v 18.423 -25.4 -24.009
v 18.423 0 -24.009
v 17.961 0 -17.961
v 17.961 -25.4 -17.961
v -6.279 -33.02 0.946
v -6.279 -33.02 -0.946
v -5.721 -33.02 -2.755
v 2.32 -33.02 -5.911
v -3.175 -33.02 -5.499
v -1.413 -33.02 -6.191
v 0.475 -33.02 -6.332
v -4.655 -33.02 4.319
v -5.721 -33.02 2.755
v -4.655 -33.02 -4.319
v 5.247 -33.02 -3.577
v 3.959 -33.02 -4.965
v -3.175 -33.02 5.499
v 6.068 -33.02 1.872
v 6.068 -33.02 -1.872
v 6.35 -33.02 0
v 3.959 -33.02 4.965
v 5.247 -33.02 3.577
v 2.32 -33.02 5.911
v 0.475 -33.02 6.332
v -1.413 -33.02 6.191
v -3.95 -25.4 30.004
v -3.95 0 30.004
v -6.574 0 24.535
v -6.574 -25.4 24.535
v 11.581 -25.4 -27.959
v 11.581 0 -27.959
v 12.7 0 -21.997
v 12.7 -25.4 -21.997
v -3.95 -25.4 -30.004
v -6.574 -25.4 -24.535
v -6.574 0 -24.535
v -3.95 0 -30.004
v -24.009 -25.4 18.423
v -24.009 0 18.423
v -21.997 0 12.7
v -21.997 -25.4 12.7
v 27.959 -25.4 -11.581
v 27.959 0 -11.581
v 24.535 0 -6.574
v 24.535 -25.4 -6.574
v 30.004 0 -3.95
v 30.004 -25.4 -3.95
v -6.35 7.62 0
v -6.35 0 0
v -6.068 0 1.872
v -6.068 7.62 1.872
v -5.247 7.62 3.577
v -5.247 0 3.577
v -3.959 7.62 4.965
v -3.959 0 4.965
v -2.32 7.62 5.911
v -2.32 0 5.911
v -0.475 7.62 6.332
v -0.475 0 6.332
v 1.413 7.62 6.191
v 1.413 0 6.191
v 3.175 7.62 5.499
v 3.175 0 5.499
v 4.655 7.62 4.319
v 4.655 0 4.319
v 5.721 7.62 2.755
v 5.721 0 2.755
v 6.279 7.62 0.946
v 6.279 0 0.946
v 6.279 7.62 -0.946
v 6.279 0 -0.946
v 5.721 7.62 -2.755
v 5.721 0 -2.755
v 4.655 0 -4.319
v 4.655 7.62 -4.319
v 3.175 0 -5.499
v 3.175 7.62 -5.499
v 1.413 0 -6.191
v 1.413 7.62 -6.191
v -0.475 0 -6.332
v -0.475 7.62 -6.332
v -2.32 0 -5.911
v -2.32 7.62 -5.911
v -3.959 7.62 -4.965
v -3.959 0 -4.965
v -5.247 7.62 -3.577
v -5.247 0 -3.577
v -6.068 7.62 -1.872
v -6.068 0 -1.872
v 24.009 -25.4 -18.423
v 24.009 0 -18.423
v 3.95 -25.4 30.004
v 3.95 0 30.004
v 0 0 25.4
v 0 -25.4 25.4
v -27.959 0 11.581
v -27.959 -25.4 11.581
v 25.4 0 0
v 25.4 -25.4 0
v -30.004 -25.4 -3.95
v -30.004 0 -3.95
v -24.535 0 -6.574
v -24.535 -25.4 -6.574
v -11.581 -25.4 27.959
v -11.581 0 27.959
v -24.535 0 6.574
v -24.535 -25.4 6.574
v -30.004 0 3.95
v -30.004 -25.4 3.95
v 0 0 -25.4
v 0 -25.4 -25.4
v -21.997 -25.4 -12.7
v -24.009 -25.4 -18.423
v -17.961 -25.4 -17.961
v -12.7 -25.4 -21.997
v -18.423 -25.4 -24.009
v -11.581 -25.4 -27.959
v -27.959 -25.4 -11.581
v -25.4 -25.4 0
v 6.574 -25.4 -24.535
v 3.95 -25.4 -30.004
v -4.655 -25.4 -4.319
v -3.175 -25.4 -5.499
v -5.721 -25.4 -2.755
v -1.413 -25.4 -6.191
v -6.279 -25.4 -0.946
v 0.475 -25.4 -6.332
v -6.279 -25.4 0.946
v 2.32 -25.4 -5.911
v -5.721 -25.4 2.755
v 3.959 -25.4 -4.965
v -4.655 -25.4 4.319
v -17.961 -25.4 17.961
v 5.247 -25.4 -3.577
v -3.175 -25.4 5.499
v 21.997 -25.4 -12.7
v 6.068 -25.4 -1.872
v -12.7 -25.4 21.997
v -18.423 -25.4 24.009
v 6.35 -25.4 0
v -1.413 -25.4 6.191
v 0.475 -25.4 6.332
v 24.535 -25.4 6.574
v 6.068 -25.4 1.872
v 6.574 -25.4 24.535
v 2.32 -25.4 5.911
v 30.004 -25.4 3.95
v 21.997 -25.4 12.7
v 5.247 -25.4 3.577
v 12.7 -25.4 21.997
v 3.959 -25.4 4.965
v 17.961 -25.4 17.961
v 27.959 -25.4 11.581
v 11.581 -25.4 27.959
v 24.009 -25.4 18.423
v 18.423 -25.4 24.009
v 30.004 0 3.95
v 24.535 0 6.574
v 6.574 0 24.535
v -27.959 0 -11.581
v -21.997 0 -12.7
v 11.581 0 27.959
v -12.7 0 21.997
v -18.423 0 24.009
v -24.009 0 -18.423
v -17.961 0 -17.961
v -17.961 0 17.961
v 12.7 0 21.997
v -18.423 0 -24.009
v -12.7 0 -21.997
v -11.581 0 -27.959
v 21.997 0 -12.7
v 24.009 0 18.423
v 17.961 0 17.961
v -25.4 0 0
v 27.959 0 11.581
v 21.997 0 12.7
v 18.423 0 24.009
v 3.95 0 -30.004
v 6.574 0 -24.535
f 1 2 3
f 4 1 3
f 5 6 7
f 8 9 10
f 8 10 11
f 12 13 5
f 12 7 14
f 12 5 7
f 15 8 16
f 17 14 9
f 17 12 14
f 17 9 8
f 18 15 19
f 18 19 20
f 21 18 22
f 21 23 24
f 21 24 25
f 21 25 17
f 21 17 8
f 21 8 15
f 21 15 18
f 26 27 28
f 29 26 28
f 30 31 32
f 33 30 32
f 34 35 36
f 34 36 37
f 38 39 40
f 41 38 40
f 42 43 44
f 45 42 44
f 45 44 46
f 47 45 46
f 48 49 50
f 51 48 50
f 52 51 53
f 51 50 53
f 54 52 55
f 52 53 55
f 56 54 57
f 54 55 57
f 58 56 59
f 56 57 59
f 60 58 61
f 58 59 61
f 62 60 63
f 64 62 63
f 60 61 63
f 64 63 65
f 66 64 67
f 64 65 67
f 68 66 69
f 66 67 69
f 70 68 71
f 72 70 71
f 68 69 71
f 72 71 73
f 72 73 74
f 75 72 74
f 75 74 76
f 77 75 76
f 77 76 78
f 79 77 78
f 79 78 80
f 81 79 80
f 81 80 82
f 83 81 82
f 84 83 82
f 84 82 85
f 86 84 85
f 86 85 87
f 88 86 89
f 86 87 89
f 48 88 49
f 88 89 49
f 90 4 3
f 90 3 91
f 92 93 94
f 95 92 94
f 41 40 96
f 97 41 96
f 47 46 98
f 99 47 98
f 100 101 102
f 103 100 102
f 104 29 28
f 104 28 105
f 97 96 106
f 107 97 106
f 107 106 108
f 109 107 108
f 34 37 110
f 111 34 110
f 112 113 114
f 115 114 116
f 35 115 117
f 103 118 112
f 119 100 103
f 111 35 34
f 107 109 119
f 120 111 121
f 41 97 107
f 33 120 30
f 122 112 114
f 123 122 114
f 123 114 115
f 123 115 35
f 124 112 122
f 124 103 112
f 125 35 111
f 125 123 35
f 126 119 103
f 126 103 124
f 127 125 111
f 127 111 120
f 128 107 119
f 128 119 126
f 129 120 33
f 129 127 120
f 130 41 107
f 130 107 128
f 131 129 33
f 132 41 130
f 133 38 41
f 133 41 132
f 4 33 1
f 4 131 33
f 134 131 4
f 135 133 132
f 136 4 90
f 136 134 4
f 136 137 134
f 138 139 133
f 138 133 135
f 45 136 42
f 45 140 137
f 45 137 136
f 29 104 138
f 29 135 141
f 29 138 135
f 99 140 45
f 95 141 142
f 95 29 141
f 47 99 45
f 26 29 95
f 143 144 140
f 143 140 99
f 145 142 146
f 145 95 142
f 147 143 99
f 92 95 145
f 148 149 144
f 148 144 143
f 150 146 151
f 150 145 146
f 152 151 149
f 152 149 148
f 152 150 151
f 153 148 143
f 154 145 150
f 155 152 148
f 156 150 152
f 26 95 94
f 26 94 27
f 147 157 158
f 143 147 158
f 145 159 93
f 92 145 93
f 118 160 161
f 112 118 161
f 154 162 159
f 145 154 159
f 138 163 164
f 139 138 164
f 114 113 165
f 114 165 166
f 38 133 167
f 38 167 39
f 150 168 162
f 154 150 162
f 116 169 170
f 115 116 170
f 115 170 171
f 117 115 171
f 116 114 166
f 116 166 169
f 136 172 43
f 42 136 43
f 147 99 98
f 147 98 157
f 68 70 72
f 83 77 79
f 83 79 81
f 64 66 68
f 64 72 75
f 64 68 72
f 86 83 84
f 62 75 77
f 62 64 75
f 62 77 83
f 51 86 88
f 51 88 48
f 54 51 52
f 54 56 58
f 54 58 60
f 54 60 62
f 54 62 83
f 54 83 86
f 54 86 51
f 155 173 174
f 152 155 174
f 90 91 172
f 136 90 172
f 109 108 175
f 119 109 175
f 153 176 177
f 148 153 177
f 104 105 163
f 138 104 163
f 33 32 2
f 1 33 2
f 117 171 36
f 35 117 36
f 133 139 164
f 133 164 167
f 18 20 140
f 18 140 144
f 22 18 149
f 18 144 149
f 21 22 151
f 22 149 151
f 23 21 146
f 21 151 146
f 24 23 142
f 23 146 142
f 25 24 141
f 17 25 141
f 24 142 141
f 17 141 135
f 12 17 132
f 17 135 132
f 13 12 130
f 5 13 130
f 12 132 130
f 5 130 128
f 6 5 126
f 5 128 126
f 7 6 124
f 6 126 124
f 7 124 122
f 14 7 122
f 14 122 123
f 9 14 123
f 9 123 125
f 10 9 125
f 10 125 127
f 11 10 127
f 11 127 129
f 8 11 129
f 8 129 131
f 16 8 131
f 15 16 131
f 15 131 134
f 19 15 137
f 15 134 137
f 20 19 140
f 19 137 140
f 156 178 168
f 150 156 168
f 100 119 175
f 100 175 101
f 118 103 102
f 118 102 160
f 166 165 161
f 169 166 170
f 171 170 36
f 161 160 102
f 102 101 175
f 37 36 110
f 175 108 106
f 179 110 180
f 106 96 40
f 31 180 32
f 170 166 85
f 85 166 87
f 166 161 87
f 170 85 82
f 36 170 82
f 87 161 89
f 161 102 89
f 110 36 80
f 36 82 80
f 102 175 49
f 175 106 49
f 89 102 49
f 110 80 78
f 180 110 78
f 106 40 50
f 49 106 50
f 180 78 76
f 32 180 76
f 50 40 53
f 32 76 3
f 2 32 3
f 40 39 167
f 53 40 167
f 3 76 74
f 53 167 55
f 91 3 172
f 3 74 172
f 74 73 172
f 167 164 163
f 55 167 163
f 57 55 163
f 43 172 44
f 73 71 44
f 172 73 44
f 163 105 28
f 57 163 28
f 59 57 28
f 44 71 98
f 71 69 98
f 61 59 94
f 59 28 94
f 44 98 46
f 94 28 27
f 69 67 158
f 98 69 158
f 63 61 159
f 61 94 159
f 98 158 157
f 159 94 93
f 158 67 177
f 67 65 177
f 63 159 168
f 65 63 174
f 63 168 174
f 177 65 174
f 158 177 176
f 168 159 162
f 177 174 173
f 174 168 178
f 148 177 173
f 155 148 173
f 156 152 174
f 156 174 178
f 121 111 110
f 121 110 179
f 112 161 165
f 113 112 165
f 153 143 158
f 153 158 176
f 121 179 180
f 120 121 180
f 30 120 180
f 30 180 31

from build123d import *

# Parameters (mm, degrees)
F1_DEPTH = 25.4
F2_R     = 6.35
F3_DEPTH = 7.62
F4_R     = 6.35
F5_DEPTH = 7.62


with BuildPart() as f1:
    # F0 (on Front) → F1 (new body)
    with BuildSketch(Plane.XZ):
        with BuildLine():
            Line((24.9672579939, 3.2870018728), (25.4, 0))
            ThreePointArc((25.4, 0), (25.3456166503, 1.6612394824), (25.1826994789, 3.3153652824))
            Line((25.1826994789, 3.3153652824), (24.9672579939, 3.2870018728))
        make_face()
        with BuildLine():
            Line((30.0037978897, -3.9500749293), (25.4, 0))
            ThreePointArc((25.4, 0), (25.3456166503, -1.6612394824), (25.1826994789, -3.3153652824))
            Line((25.1826994789, -3.3153652824), (30.0037978897, -3.9500749293))
        make_face()
        Polygon((24.9672579939, -3.2870018728), (25.4, 0), (0, 0), (24.5345159877, -6.5740037456), align=None)
        with BuildLine():
            ThreePointArc((25.1826994789, -3.3153652824), (25.3456166503, -1.6612394824), (25.4, 0))
            Line((25.4, 0), (24.9672579939, -3.2870018728))
            Line((24.9672579939, -3.2870018728), (25.1826994789, -3.3153652824))
        make_face()
        Polygon((0, 0), (25.4, 0), (24.9672579939, 3.2870018728), (24.5345159877, 6.5740037456), align=None)
        with BuildLine():
            ThreePointArc((25.1826994789, 3.3153652824), (25.3456166503, 1.6612394824), (25.4, 0))
            Line((25.4, 0), (30.0037978897, 3.9500749293))
            Line((30.0037978897, 3.9500749293), (25.1826994789, 3.3153652824))
        make_face()
        with BuildLine():
            Line((24.9672579939, 3.2870018728), (25.1826994789, 3.3153652824))
            ThreePointArc((25.1826994789, 3.3153652824), (24.9119461222, 4.9552941792), (24.5345159877, 6.5740037456))
            Line((24.5345159877, 6.5740037456), (24.9672579939, 3.2870018728))
        make_face()
        with BuildLine():
            ThreePointArc((24.5345159877, 6.5740037456), (24.9119461222, 4.9552941792), (25.1826994789, 3.3153652824))
            Line((25.1826994789, 3.3153652824), (30.0037978897, 3.9500749293))
            Line((30.0037978897, 3.9500749293), (24.5345159877, 6.5740037456))
        make_face()
        with BuildLine():
            Line((30.0037978897, -3.9500749293), (25.1826994789, -3.3153652824))
            ThreePointArc((25.1826994789, -3.3153652824), (24.9119461222, -4.9552941792), (24.5345159877, -6.5740037456))
            Line((24.5345159877, -6.5740037456), (30.0037978897, -3.9500749293))
        make_face()
        with BuildLine():
            ThreePointArc((24.5345159877, -6.5740037456), (24.9119461222, -4.9552941792), (25.1826994789, -3.3153652824))
            Line((25.1826994789, -3.3153652824), (24.9672579939, -3.2870018728))
            Line((24.9672579939, -3.2870018728), (24.5345159877, -6.5740037456))
        make_face()
        Polygon((-6.5740037456, 24.5345159877), (0, 0), (0, 25.4), (-3.2870018728, 24.9672579939), align=None)
        Polygon((-24.5345159877, -6.5740037456), (0, 0), (-25.4, 0), (-24.9672579939, -3.2870018728), align=None)
        Polygon((6.5740037456, -24.5345159877), (0, 0), (0, -25.4), (3.2870018728, -24.9672579939), align=None)
        Polygon((21.9970452561, 12.7), (0, 0), (24.5345159877, 6.5740037456), (23.2657806219, 9.6370018728), align=None)
        Polygon((17.9605122421, 17.9605122421), (0, 0), (21.9970452561, 12.7), (19.9787787491, 15.3302561211), align=None)
        Polygon((12.7, 21.9970452561), (0, 0), (17.9605122421, 17.9605122421), (15.3302561211, 19.9787787491), align=None)
        Polygon((6.5740037456, 24.5345159877), (0, 0), (12.7, 21.9970452561), (9.6370018728, 23.2657806219), align=None)
        Polygon((0, 25.4), (0, 0), (6.5740037456, 24.5345159877), (3.2870018728, 24.9672579939), align=None)
        Polygon((0, -25.4), (0, 0), (-6.5740037456, -24.5345159877), (-3.2870018728, -24.9672579939), align=None)
        Polygon((24.5345159877, -6.5740037456), (0, 0), (21.9970452561, -12.7), (23.2657806219, -9.6370018728), align=None)
        Polygon((21.9970452561, -12.7), (0, 0), (17.9605122421, -17.9605122421), (19.9787787491, -15.3302561211), align=None)
        Polygon((17.9605122421, -17.9605122421), (0, 0), (12.7, -21.9970452561), (15.3302561211, -19.9787787491), align=None)
        Polygon((12.7, -21.9970452561), (0, 0), (6.5740037456, -24.5345159877), (9.6370018728, -23.2657806219), align=None)
        Polygon((-6.5740037456, -24.5345159877), (0, 0), (-12.7, -21.9970452561), (-9.6370018728, -23.2657806219), align=None)
        Polygon((-12.7, -21.9970452561), (0, 0), (-17.9605122421, -17.9605122421), (-15.3302561211, -19.9787787491), align=None)
        Polygon((-17.9605122421, -17.9605122421), (0, 0), (-21.9970452561, -12.7), (-19.9787787491, -15.3302561211), align=None)
        Polygon((-21.9970452561, -12.7), (0, 0), (-24.5345159877, -6.5740037456), (-23.2657806219, -9.6370018728), align=None)
        Polygon((-25.4, 0), (0, 0), (-24.5345159877, 6.5740037456), (-24.9672579939, 3.2870018728), align=None)
        Polygon((-24.5345159877, 6.5740037456), (0, 0), (-21.9970452561, 12.7), (-23.2657806219, 9.6370018728), align=None)
        Polygon((-21.9970452561, 12.7), (0, 0), (-17.9605122421, 17.9605122421), (-19.9787787491, 15.3302561211), align=None)
        Polygon((-17.9605122421, 17.9605122421), (0, 0), (-12.7, 21.9970452561), (-15.3302561211, 19.9787787491), align=None)
        Polygon((-12.7, 21.9970452561), (0, 0), (-6.5740037456, 24.5345159877), (-9.6370018728, 23.2657806219), align=None)
        with BuildLine():
            Line((23.2657806219, 9.6370018728), (24.5345159877, 6.5740037456))
            ThreePointArc((24.5345159877, 6.5740037456), (24.0520252892, 8.1645624187), (23.4665401258, 9.7201591821))
            Line((23.4665401258, 9.7201591821), (23.2657806219, 9.6370018728))
        make_face()
        with BuildLine():
            ThreePointArc((23.4665401258, 9.7201591821), (24.0520252892, 8.1645624187), (24.5345159877, 6.5740037456))
            Line((24.5345159877, 6.5740037456), (27.9590886471, 11.5810337092))
            Line((27.9590886471, 11.5810337092), (23.4665401258, 9.7201591821))
        make_face()
        with BuildLine():
            Line((27.9590886471, -11.5810337092), (24.5345159877, -6.5740037456))
            ThreePointArc((24.5345159877, -6.5740037456), (24.0520252892, -8.1645624187), (23.4665401258, -9.7201591821))
            Line((23.4665401258, -9.7201591821), (27.9590886471, -11.5810337092))
        make_face()
        with BuildLine():
            ThreePointArc((23.4665401258, -9.7201591821), (24.0520252892, -8.1645624187), (24.5345159877, -6.5740037456))
            Line((24.5345159877, -6.5740037456), (23.2657806219, -9.6370018728))
            Line((23.2657806219, -9.6370018728), (23.4665401258, -9.7201591821))
        make_face()
        with BuildLine():
            Line((3.9500749293, 30.0037978897), (0, 25.4))
            ThreePointArc((0, 25.4), (1.6612394824, 25.3456166503), (3.3153652824, 25.1826994789))
            Line((3.3153652824, 25.1826994789), (3.9500749293, 30.0037978897))
        make_face()
        with BuildLine():
            Line((-3.2870018728, 24.9672579939), (0, 25.4))
            ThreePointArc((0, 25.4), (-1.6612394824, 25.3456166503), (-3.3153652824, 25.1826994789))
            Line((-3.3153652824, 25.1826994789), (-3.2870018728, 24.9672579939))
        make_face()
        with BuildLine():
            ThreePointArc((3.3153652824, 25.1826994789), (1.6612394824, 25.3456166503), (0, 25.4))
            Line((0, 25.4), (3.2870018728, 24.9672579939))
            Line((3.2870018728, 24.9672579939), (3.3153652824, 25.1826994789))
        make_face()
        with BuildLine():
            ThreePointArc((-3.3153652824, 25.1826994789), (-1.6612394824, 25.3456166503), (0, 25.4))
            Line((0, 25.4), (-3.9500749293, 30.0037978897))
            Line((-3.9500749293, 30.0037978897), (-3.3153652824, 25.1826994789))
        make_face()
        with BuildLine():
            Line((-30.0037978897, 3.9500749293), (-25.4, 0))
            ThreePointArc((-25.4, 0), (-25.3456166503, 1.6612394824), (-25.1826994789, 3.3153652824))
            Line((-25.1826994789, 3.3153652824), (-30.0037978897, 3.9500749293))
        make_face()
        with BuildLine():
            Line((-24.9672579939, -3.2870018728), (-25.4, 0))
            ThreePointArc((-25.4, 0), (-25.3456166503, -1.6612394824), (-25.1826994789, -3.3153652824))
            Line((-25.1826994789, -3.3153652824), (-24.9672579939, -3.2870018728))
        make_face()
        with BuildLine():
            ThreePointArc((-25.1826994789, 3.3153652824), (-25.3456166503, 1.6612394824), (-25.4, 0))
            Line((-25.4, 0), (-24.9672579939, 3.2870018728))
            Line((-24.9672579939, 3.2870018728), (-25.1826994789, 3.3153652824))
        make_face()
        with BuildLine():
            ThreePointArc((-25.1826994789, -3.3153652824), (-25.3456166503, -1.6612394824), (-25.4, 0))
            Line((-25.4, 0), (-30.0037978897, -3.9500749293))
            Line((-30.0037978897, -3.9500749293), (-25.1826994789, -3.3153652824))
        make_face()
        with BuildLine():
            Line((-3.9500749293, -30.0037978896), (0, -25.4))
            ThreePointArc((0, -25.4), (-1.6612394824, -25.3456166503), (-3.3153652824, -25.1826994789))
            Line((-3.3153652824, -25.1826994789), (-3.9500749293, -30.0037978896))
        make_face()
        with BuildLine():
            Line((3.2870018728, -24.9672579939), (0, -25.4))
            ThreePointArc((0, -25.4), (1.6612394824, -25.3456166503), (3.3153652824, -25.1826994789))
            Line((3.3153652824, -25.1826994789), (3.2870018728, -24.9672579939))
        make_face()
        with BuildLine():
            ThreePointArc((-3.3153652824, -25.1826994789), (-1.6612394824, -25.3456166503), (0, -25.4))
            Line((0, -25.4), (-3.2870018728, -24.9672579939))
            Line((-3.2870018728, -24.9672579939), (-3.3153652824, -25.1826994789))
        make_face()
        with BuildLine():
            ThreePointArc((3.3153652824, -25.1826994789), (1.6612394824, -25.3456166503), (0, -25.4))
            Line((0, -25.4), (3.9500749293, -30.0037978897))
            Line((3.9500749293, -30.0037978897), (3.3153652824, -25.1826994789))
        make_face()
        with BuildLine():
            Line((27.9590886471, 11.5810337092), (21.9970452561, 12.7))
            ThreePointArc((21.9970452561, 12.7), (22.7805676349, 11.2341327316), (23.4665401258, 9.7201591821))
            Line((23.4665401258, 9.7201591821), (27.9590886471, 11.5810337092))
        make_face()
        with BuildLine():
            Line((19.9787787491, 15.3302561211), (21.9970452561, 12.7))
            ThreePointArc((21.9970452561, 12.7), (21.1193281525, 14.1114839187), (20.1511748434, 15.4625402968))
            Line((20.1511748434, 15.4625402968), (19.9787787491, 15.3302561211))
        make_face()
        with BuildLine():
            ThreePointArc((23.4665401258, 9.7201591821), (22.7805676349, 11.2341327316), (21.9970452561, 12.7))
            Line((21.9970452561, 12.7), (23.2657806219, 9.6370018728))
            Line((23.2657806219, 9.6370018728), (23.4665401258, 9.7201591821))
        make_face()
        with BuildLine():
            ThreePointArc((20.1511748434, 15.4625402968), (21.1193281525, 14.1114839187), (21.9970452561, 12.7))
            Line((21.9970452561, 12.7), (24.0090137178, 18.4227641804))
            Line((24.0090137178, 18.4227641804), (20.1511748434, 15.4625402968))
        make_face()
        with BuildLine():
            Line((24.0090137178, 18.4227641804), (17.9605122421, 17.9605122421))
            ThreePointArc((17.9605122421, 17.9605122421), (19.09673111, 16.7473837035), (20.1511748434, 15.4625402968))
            Line((20.1511748434, 15.4625402968), (24.0090137178, 18.4227641804))
        make_face()
        with BuildLine():
            Line((15.3302561211, 19.9787787491), (17.9605122421, 17.9605122421))
            ThreePointArc((17.9605122421, 17.9605122421), (16.7473837035, 19.09673111), (15.4625402968, 20.1511748434))
            Line((15.4625402968, 20.1511748434), (15.3302561211, 19.9787787491))
        make_face()
        with BuildLine():
            ThreePointArc((20.1511748434, 15.4625402968), (19.09673111, 16.7473837035), (17.9605122421, 17.9605122421))
            Line((17.9605122421, 17.9605122421), (19.9787787491, 15.3302561211))
            Line((19.9787787491, 15.3302561211), (20.1511748434, 15.4625402968))
        make_face()
        with BuildLine():
            ThreePointArc((15.4625402968, 20.1511748434), (16.7473837035, 19.09673111), (17.9605122421, 17.9605122421))
            Line((17.9605122421, 17.9605122421), (18.4227641804, 24.0090137178))
            Line((18.4227641804, 24.0090137178), (15.4625402968, 20.1511748434))
        make_face()
        with BuildLine():
            Line((18.4227641804, 24.0090137178), (12.7, 21.9970452561))
            ThreePointArc((12.7, 21.9970452561), (14.1114839187, 21.1193281525), (15.4625402968, 20.1511748434))
            Line((15.4625402968, 20.1511748434), (18.4227641804, 24.0090137178))
        make_face()
        with BuildLine():
            Line((9.6370018728, 23.2657806219), (12.7, 21.9970452561))
            ThreePointArc((12.7, 21.9970452561), (11.2341327316, 22.7805676349), (9.7201591821, 23.4665401258))
            Line((9.7201591821, 23.4665401258), (9.6370018728, 23.2657806219))
        make_face()
        with BuildLine():
            ThreePointArc((15.4625402968, 20.1511748434), (14.1114839187, 21.1193281525), (12.7, 21.9970452561))
            Line((12.7, 21.9970452561), (15.3302561211, 19.9787787491))
            Line((15.3302561211, 19.9787787491), (15.4625402968, 20.1511748434))
        make_face()
        with BuildLine():
            ThreePointArc((9.7201591821, 23.4665401258), (11.2341327316, 22.7805676349), (12.7, 21.9970452561))
            Line((12.7, 21.9970452561), (11.5810337092, 27.9590886471))
            Line((11.5810337092, 27.9590886471), (9.7201591821, 23.4665401258))
        make_face()
        with BuildLine():
            Line((11.5810337092, 27.9590886471), (6.5740037456, 24.5345159877))
            ThreePointArc((6.5740037456, 24.5345159877), (8.1645624187, 24.0520252892), (9.7201591821, 23.4665401258))
            Line((9.7201591821, 23.4665401258), (11.5810337092, 27.9590886471))
        make_face()
        with BuildLine():
            Line((3.2870018728, 24.9672579939), (6.5740037456, 24.5345159877))
            ThreePointArc((6.5740037456, 24.5345159877), (4.9552941792, 24.9119461222), (3.3153652824, 25.1826994789))
            Line((3.3153652824, 25.1826994789), (3.2870018728, 24.9672579939))
        make_face()
        with BuildLine():
            ThreePointArc((9.7201591821, 23.4665401258), (8.1645624187, 24.0520252892), (6.5740037456, 24.5345159877))
            Line((6.5740037456, 24.5345159877), (9.6370018728, 23.2657806219))
            Line((9.6370018728, 23.2657806219), (9.7201591821, 23.4665401258))
        make_face()
        with BuildLine():
            ThreePointArc((3.3153652824, 25.1826994789), (4.9552941792, 24.9119461222), (6.5740037456, 24.5345159877))
            Line((6.5740037456, 24.5345159877), (3.9500749293, 30.0037978897))
            Line((3.9500749293, 30.0037978897), (3.3153652824, 25.1826994789))
        make_face()
        with BuildLine():
            Line((-11.5810337092, -27.9590886471), (-6.5740037456, -24.5345159877))
            ThreePointArc((-6.5740037456, -24.5345159877), (-8.1645624187, -24.0520252892), (-9.7201591821, -23.4665401258))
            Line((-9.7201591821, -23.4665401258), (-11.5810337092, -27.9590886471))
        make_face()
        with BuildLine():
            Line((-3.2870018728, -24.9672579939), (-6.5740037456, -24.5345159877))
            ThreePointArc((-6.5740037456, -24.5345159877), (-4.9552941792, -24.9119461222), (-3.3153652824, -25.1826994789))
            Line((-3.3153652824, -25.1826994789), (-3.2870018728, -24.9672579939))
        make_face()
        with BuildLine():
            ThreePointArc((-9.7201591821, -23.4665401258), (-8.1645624187, -24.0520252892), (-6.5740037456, -24.5345159877))
            Line((-6.5740037456, -24.5345159877), (-9.6370018728, -23.2657806219))
            Line((-9.6370018728, -23.2657806219), (-9.7201591821, -23.4665401258))
        make_face()
        with BuildLine():
            ThreePointArc((-3.3153652824, -25.1826994789), (-4.9552941792, -24.9119461222), (-6.5740037456, -24.5345159877))
            Line((-6.5740037456, -24.5345159877), (-3.9500749293, -30.0037978897))
            Line((-3.9500749293, -30.0037978896), (-3.3153652824, -25.1826994789))
        make_face()
        with BuildLine():
            Line((24.0090137178, -18.4227641804), (21.9970452561, -12.7))
            ThreePointArc((21.9970452561, -12.7), (21.1193281525, -14.1114839187), (20.1511748434, -15.4625402968))
            Line((20.1511748434, -15.4625402968), (24.0090137178, -18.4227641804))
        make_face()
        with BuildLine():
            Line((23.2657806219, -9.6370018728), (21.9970452561, -12.7))
            ThreePointArc((21.9970452561, -12.7), (22.7805676349, -11.2341327316), (23.4665401258, -9.7201591821))
            Line((23.4665401258, -9.7201591821), (23.2657806219, -9.6370018728))
        make_face()
        with BuildLine():
            ThreePointArc((20.1511748434, -15.4625402968), (21.1193281525, -14.1114839187), (21.9970452561, -12.7))
            Line((21.9970452561, -12.7), (19.9787787491, -15.3302561211))
            Line((19.9787787491, -15.3302561211), (20.1511748434, -15.4625402968))
        make_face()
        with BuildLine():
            ThreePointArc((23.4665401258, -9.7201591821), (22.7805676349, -11.2341327316), (21.9970452561, -12.7))
            Line((21.9970452561, -12.7), (27.9590886471, -11.5810337092))
            Line((27.9590886471, -11.5810337092), (23.4665401258, -9.7201591821))
        make_face()
        with BuildLine():
            Line((18.4227641804, -24.0090137178), (17.9605122421, -17.9605122421))
            ThreePointArc((17.9605122421, -17.9605122421), (16.7473837035, -19.09673111), (15.4625402968, -20.1511748434))
            Line((15.4625402968, -20.1511748434), (18.4227641804, -24.0090137178))
        make_face()
        with BuildLine():
            Line((19.9787787491, -15.3302561211), (17.9605122421, -17.9605122421))
            ThreePointArc((17.9605122421, -17.9605122421), (19.09673111, -16.7473837035), (20.1511748434, -15.4625402968))
            Line((20.1511748434, -15.4625402968), (19.9787787491, -15.3302561211))
        make_face()
        with BuildLine():
            ThreePointArc((15.4625402968, -20.1511748434), (16.7473837035, -19.09673111), (17.9605122421, -17.9605122421))
            Line((17.9605122421, -17.9605122421), (15.3302561211, -19.9787787491))
            Line((15.3302561211, -19.9787787491), (15.4625402968, -20.1511748434))
        make_face()
        with BuildLine():
            ThreePointArc((20.1511748434, -15.4625402968), (19.09673111, -16.7473837035), (17.9605122421, -17.9605122421))
            Line((17.9605122421, -17.9605122421), (24.0090137178, -18.4227641804))
            Line((24.0090137178, -18.4227641804), (20.1511748434, -15.4625402968))
        make_face()
        with BuildLine():
            Line((11.5810337092, -27.9590886471), (12.7, -21.9970452561))
            ThreePointArc((12.7, -21.9970452561), (11.2341327316, -22.7805676349), (9.7201591821, -23.4665401258))
            Line((9.7201591821, -23.4665401258), (11.5810337092, -27.9590886471))
        make_face()
        with BuildLine():
            Line((15.3302561211, -19.9787787491), (12.7, -21.9970452561))
            ThreePointArc((12.7, -21.9970452561), (14.1114839187, -21.1193281525), (15.4625402968, -20.1511748434))
            Line((15.4625402968, -20.1511748434), (15.3302561211, -19.9787787491))
        make_face()
        with BuildLine():
            ThreePointArc((9.7201591821, -23.4665401258), (11.2341327316, -22.7805676349), (12.7, -21.9970452561))
            Line((12.7, -21.9970452561), (9.6370018728, -23.2657806219))
            Line((9.6370018728, -23.2657806219), (9.7201591821, -23.4665401258))
        make_face()
        with BuildLine():
            ThreePointArc((15.4625402968, -20.1511748434), (14.1114839187, -21.1193281525), (12.7, -21.9970452561))
            Line((12.7, -21.9970452561), (18.4227641804, -24.0090137178))
            Line((18.4227641804, -24.0090137178), (15.4625402968, -20.1511748434))
        make_face()
        with BuildLine():
            Line((3.9500749293, -30.0037978897), (6.5740037456, -24.5345159877))
            ThreePointArc((6.5740037456, -24.5345159877), (4.9552941792, -24.9119461222), (3.3153652824, -25.1826994789))
            Line((3.3153652824, -25.1826994789), (3.9500749293, -30.0037978897))
        make_face()
        with BuildLine():
            Line((9.6370018728, -23.2657806219), (6.5740037456, -24.5345159877))
            ThreePointArc((6.5740037456, -24.5345159877), (8.1645624187, -24.0520252892), (9.7201591821, -23.4665401258))
            Line((9.7201591821, -23.4665401258), (9.6370018728, -23.2657806219))
        make_face()
        with BuildLine():
            ThreePointArc((3.3153652824, -25.1826994789), (4.9552941792, -24.9119461222), (6.5740037456, -24.5345159877))
            Line((6.5740037456, -24.5345159877), (3.2870018728, -24.9672579939))
            Line((3.2870018728, -24.9672579939), (3.3153652824, -25.1826994789))
        make_face()
        with BuildLine():
            ThreePointArc((9.7201591821, -23.4665401258), (8.1645624187, -24.0520252892), (6.5740037456, -24.5345159877))
            Line((6.5740037456, -24.5345159877), (11.5810337092, -27.9590886471))
            Line((11.5810337092, -27.9590886471), (9.7201591821, -23.4665401258))
        make_face()
        with BuildLine():
            Line((-18.4227641804, -24.0090137178), (-12.7, -21.9970452561))
            ThreePointArc((-12.7, -21.9970452561), (-14.1114839187, -21.1193281525), (-15.4625402968, -20.1511748434))
            Line((-15.4625402968, -20.1511748434), (-18.4227641804, -24.0090137178))
        make_face()
        with BuildLine():
            Line((-9.6370018728, -23.2657806219), (-12.7, -21.9970452561))
            ThreePointArc((-12.7, -21.9970452561), (-11.2341327316, -22.7805676349), (-9.7201591821, -23.4665401258))
            Line((-9.7201591821, -23.4665401258), (-9.6370018728, -23.2657806219))
        make_face()
        with BuildLine():
            ThreePointArc((-15.4625402968, -20.1511748434), (-14.1114839187, -21.1193281525), (-12.7, -21.9970452561))
            Line((-12.7, -21.9970452561), (-15.3302561211, -19.9787787491))
            Line((-15.3302561211, -19.9787787491), (-15.4625402968, -20.1511748434))
        make_face()
        with BuildLine():
            ThreePointArc((-9.7201591821, -23.4665401258), (-11.2341327316, -22.7805676349), (-12.7, -21.9970452561))
            Line((-12.7, -21.9970452561), (-11.5810337092, -27.9590886471))
            Line((-11.5810337092, -27.9590886471), (-9.7201591821, -23.4665401258))
        make_face()
        with BuildLine():
            Line((-24.0090137178, -18.4227641804), (-17.9605122421, -17.9605122421))
            ThreePointArc((-17.9605122421, -17.9605122421), (-19.09673111, -16.7473837035), (-20.1511748434, -15.4625402968))
            Line((-20.1511748434, -15.4625402968), (-24.0090137178, -18.4227641804))
        make_face()
        with BuildLine():
            Line((-15.3302561211, -19.9787787491), (-17.9605122421, -17.9605122421))
            ThreePointArc((-17.9605122421, -17.9605122421), (-16.7473837035, -19.09673111), (-15.4625402968, -20.1511748434))
            Line((-15.4625402968, -20.1511748434), (-15.3302561211, -19.9787787491))
        make_face()
        with BuildLine():
            ThreePointArc((-20.1511748434, -15.4625402968), (-19.09673111, -16.7473837035), (-17.9605122421, -17.9605122421))
            Line((-17.9605122421, -17.9605122421), (-19.9787787491, -15.3302561211))
            Line((-19.9787787491, -15.3302561211), (-20.1511748434, -15.4625402968))
        make_face()
        with BuildLine():
            ThreePointArc((-15.4625402968, -20.1511748434), (-16.7473837035, -19.09673111), (-17.9605122421, -17.9605122421))
            Line((-17.9605122421, -17.9605122421), (-18.4227641804, -24.0090137178))
            Line((-18.4227641804, -24.0090137178), (-15.4625402968, -20.1511748434))
        make_face()
        with BuildLine():
            Line((-27.9590886471, -11.5810337092), (-21.9970452561, -12.7))
            ThreePointArc((-21.9970452561, -12.7), (-22.7805676349, -11.2341327316), (-23.4665401258, -9.7201591821))
            Line((-23.4665401258, -9.7201591821), (-27.9590886471, -11.5810337092))
        make_face()
        with BuildLine():
            Line((-19.9787787491, -15.3302561211), (-21.9970452561, -12.7))
            ThreePointArc((-21.9970452561, -12.7), (-21.1193281525, -14.1114839187), (-20.1511748434, -15.4625402968))
            Line((-20.1511748434, -15.4625402968), (-19.9787787491, -15.3302561211))
        make_face()
        with BuildLine():
            ThreePointArc((-23.4665401258, -9.7201591821), (-22.7805676349, -11.2341327316), (-21.9970452561, -12.7))
            Line((-21.9970452561, -12.7), (-23.2657806219, -9.6370018728))
            Line((-23.2657806219, -9.6370018728), (-23.4665401258, -9.7201591821))
        make_face()
        with BuildLine():
            ThreePointArc((-20.1511748434, -15.4625402968), (-21.1193281525, -14.1114839187), (-21.9970452561, -12.7))
            Line((-21.9970452561, -12.7), (-24.0090137178, -18.4227641804))
            Line((-24.0090137178, -18.4227641804), (-20.1511748434, -15.4625402968))
        make_face()
        with BuildLine():
            Line((-30.0037978897, -3.9500749293), (-24.5345159877, -6.5740037456))
            ThreePointArc((-24.5345159877, -6.5740037456), (-24.9119461222, -4.9552941792), (-25.1826994789, -3.3153652824))
            Line((-25.1826994789, -3.3153652824), (-30.0037978897, -3.9500749293))
        make_face()
        with BuildLine():
            Line((-23.2657806219, -9.6370018728), (-24.5345159877, -6.5740037456))
            ThreePointArc((-24.5345159877, -6.5740037456), (-24.0520252892, -8.1645624187), (-23.4665401258, -9.7201591821))
            Line((-23.4665401258, -9.7201591821), (-23.2657806219, -9.6370018728))
        make_face()
        with BuildLine():
            ThreePointArc((-25.1826994789, -3.3153652824), (-24.9119461222, -4.9552941792), (-24.5345159877, -6.5740037456))
            Line((-24.5345159877, -6.5740037456), (-24.9672579939, -3.2870018728))
            Line((-24.9672579939, -3.2870018728), (-25.1826994789, -3.3153652824))
        make_face()
        with BuildLine():
            ThreePointArc((-23.4665401258, -9.7201591821), (-24.0520252892, -8.1645624187), (-24.5345159877, -6.5740037456))
            Line((-24.5345159877, -6.5740037456), (-27.9590886471, -11.5810337092))
            Line((-27.9590886471, -11.5810337092), (-23.4665401258, -9.7201591821))
        make_face()
        with BuildLine():
            Line((-27.9590886471, 11.5810337092), (-24.5345159877, 6.5740037456))
            ThreePointArc((-24.5345159877, 6.5740037456), (-24.0520252892, 8.1645624187), (-23.4665401258, 9.7201591821))
            Line((-23.4665401258, 9.7201591821), (-27.9590886471, 11.5810337092))
        make_face()
        with BuildLine():
            Line((-24.9672579939, 3.2870018728), (-24.5345159877, 6.5740037456))
            ThreePointArc((-24.5345159877, 6.5740037456), (-24.9119461222, 4.9552941792), (-25.1826994789, 3.3153652824))
            Line((-25.1826994789, 3.3153652824), (-24.9672579939, 3.2870018728))
        make_face()
        with BuildLine():
            ThreePointArc((-23.4665401258, 9.7201591821), (-24.0520252892, 8.1645624187), (-24.5345159877, 6.5740037456))
            Line((-24.5345159877, 6.5740037456), (-23.2657806219, 9.6370018728))
            Line((-23.2657806219, 9.6370018728), (-23.4665401258, 9.7201591821))
        make_face()
        with BuildLine():
            ThreePointArc((-25.1826994789, 3.3153652824), (-24.9119461222, 4.9552941792), (-24.5345159877, 6.5740037456))
            Line((-24.5345159877, 6.5740037456), (-30.0037978897, 3.9500749293))
            Line((-30.0037978897, 3.9500749293), (-25.1826994789, 3.3153652824))
        make_face()
        with BuildLine():
            Line((-24.0090137178, 18.4227641804), (-21.9970452561, 12.7))
            ThreePointArc((-21.9970452561, 12.7), (-21.1193281525, 14.1114839187), (-20.1511748434, 15.4625402968))
            Line((-20.1511748434, 15.4625402968), (-24.0090137178, 18.4227641804))
        make_face()
        with BuildLine():
            Line((-23.2657806219, 9.6370018728), (-21.9970452561, 12.7))
            ThreePointArc((-21.9970452561, 12.7), (-22.7805676349, 11.2341327316), (-23.4665401258, 9.7201591821))
            Line((-23.4665401258, 9.7201591821), (-23.2657806219, 9.6370018728))
        make_face()
        with BuildLine():
            ThreePointArc((-20.1511748434, 15.4625402968), (-21.1193281525, 14.1114839187), (-21.9970452561, 12.7))
            Line((-21.9970452561, 12.7), (-19.9787787491, 15.3302561211))
            Line((-19.9787787491, 15.3302561211), (-20.1511748434, 15.4625402968))
        make_face()
        with BuildLine():
            ThreePointArc((-23.4665401258, 9.7201591821), (-22.7805676349, 11.2341327316), (-21.9970452561, 12.7))
            Line((-21.9970452561, 12.7), (-27.9590886471, 11.5810337092))
            Line((-27.9590886471, 11.5810337092), (-23.4665401258, 9.7201591821))
        make_face()
        with BuildLine():
            Line((-18.4227641804, 24.0090137178), (-17.9605122421, 17.9605122421))
            ThreePointArc((-17.9605122421, 17.9605122421), (-16.7473837035, 19.09673111), (-15.4625402968, 20.1511748434))
            Line((-15.4625402968, 20.1511748434), (-18.4227641804, 24.0090137178))
        make_face()
        with BuildLine():
            Line((-19.9787787491, 15.3302561211), (-17.9605122421, 17.9605122421))
            ThreePointArc((-17.9605122421, 17.9605122421), (-19.09673111, 16.7473837035), (-20.1511748434, 15.4625402968))
            Line((-20.1511748434, 15.4625402968), (-19.9787787491, 15.3302561211))
        make_face()
        with BuildLine():
            ThreePointArc((-15.4625402968, 20.1511748434), (-16.7473837035, 19.09673111), (-17.9605122421, 17.9605122421))
            Line((-17.9605122421, 17.9605122421), (-15.3302561211, 19.9787787491))
            Line((-15.3302561211, 19.9787787491), (-15.4625402968, 20.1511748434))
        make_face()
        with BuildLine():
            ThreePointArc((-20.1511748434, 15.4625402968), (-19.09673111, 16.7473837035), (-17.9605122421, 17.9605122421))
            Line((-17.9605122421, 17.9605122421), (-24.0090137178, 18.4227641804))
            Line((-24.0090137178, 18.4227641804), (-20.1511748434, 15.4625402968))
        make_face()
        with BuildLine():
            Line((-11.5810337092, 27.9590886471), (-12.7, 21.9970452561))
            ThreePointArc((-12.7, 21.9970452561), (-11.2341327316, 22.7805676349), (-9.7201591821, 23.4665401258))
            Line((-9.7201591821, 23.4665401258), (-11.5810337092, 27.9590886471))
        make_face()
        with BuildLine():
            Line((-15.3302561211, 19.9787787491), (-12.7, 21.9970452561))
            ThreePointArc((-12.7, 21.9970452561), (-14.1114839187, 21.1193281525), (-15.4625402968, 20.1511748434))
            Line((-15.4625402968, 20.1511748434), (-15.3302561211, 19.9787787491))
        make_face()
        with BuildLine():
            ThreePointArc((-9.7201591821, 23.4665401258), (-11.2341327316, 22.7805676349), (-12.7, 21.9970452561))
            Line((-12.7, 21.9970452561), (-9.6370018728, 23.2657806219))
            Line((-9.6370018728, 23.2657806219), (-9.7201591821, 23.4665401258))
        make_face()
        with BuildLine():
            ThreePointArc((-15.4625402968, 20.1511748434), (-14.1114839187, 21.1193281525), (-12.7, 21.9970452561))
            Line((-12.7, 21.9970452561), (-18.4227641804, 24.0090137178))
            Line((-18.4227641804, 24.0090137178), (-15.4625402968, 20.1511748434))
        make_face()
        with BuildLine():
            Line((-3.9500749293, 30.0037978897), (-6.5740037456, 24.5345159877))
            ThreePointArc((-6.5740037456, 24.5345159877), (-4.9552941792, 24.9119461222), (-3.3153652824, 25.1826994789))
            Line((-3.3153652824, 25.1826994789), (-3.9500749293, 30.0037978897))
        make_face()
        with BuildLine():
            Line((-9.6370018728, 23.2657806219), (-6.5740037456, 24.5345159877))
            ThreePointArc((-6.5740037456, 24.5345159877), (-8.1645624187, 24.0520252892), (-9.7201591821, 23.4665401258))
            Line((-9.7201591821, 23.4665401258), (-9.6370018728, 23.2657806219))
        make_face()
        with BuildLine():
            ThreePointArc((-3.3153652824, 25.1826994789), (-4.9552941792, 24.9119461222), (-6.5740037456, 24.5345159877))
            Line((-6.5740037456, 24.5345159877), (-3.2870018728, 24.9672579939))
            Line((-3.2870018728, 24.9672579939), (-3.3153652824, 25.1826994789))
        make_face()
        with BuildLine():
            ThreePointArc((-9.7201591821, 23.4665401258), (-8.1645624187, 24.0520252892), (-6.5740037456, 24.5345159877))
            Line((-6.5740037456, 24.5345159877), (-11.5810337092, 27.9590886471))
            Line((-11.5810337092, 27.9590886471), (-9.7201591821, 23.4665401258))
        make_face()
    extrude(amount=F1_DEPTH)

    # F2 (on face) → F3 (join)
    with BuildSketch(Plane.XZ.offset(25.4)):
        Circle(F2_R)
    extrude(amount=F3_DEPTH)

    # F4 (on face) → F5 (join)
    with BuildSketch(Plane(origin=(0, 0, 0), x_dir=(-1, 0, 0), z_dir=(0, 1, 0))):
        Circle(F4_R)
    extrude(amount=F5_DEPTH)


solid = f1.part
